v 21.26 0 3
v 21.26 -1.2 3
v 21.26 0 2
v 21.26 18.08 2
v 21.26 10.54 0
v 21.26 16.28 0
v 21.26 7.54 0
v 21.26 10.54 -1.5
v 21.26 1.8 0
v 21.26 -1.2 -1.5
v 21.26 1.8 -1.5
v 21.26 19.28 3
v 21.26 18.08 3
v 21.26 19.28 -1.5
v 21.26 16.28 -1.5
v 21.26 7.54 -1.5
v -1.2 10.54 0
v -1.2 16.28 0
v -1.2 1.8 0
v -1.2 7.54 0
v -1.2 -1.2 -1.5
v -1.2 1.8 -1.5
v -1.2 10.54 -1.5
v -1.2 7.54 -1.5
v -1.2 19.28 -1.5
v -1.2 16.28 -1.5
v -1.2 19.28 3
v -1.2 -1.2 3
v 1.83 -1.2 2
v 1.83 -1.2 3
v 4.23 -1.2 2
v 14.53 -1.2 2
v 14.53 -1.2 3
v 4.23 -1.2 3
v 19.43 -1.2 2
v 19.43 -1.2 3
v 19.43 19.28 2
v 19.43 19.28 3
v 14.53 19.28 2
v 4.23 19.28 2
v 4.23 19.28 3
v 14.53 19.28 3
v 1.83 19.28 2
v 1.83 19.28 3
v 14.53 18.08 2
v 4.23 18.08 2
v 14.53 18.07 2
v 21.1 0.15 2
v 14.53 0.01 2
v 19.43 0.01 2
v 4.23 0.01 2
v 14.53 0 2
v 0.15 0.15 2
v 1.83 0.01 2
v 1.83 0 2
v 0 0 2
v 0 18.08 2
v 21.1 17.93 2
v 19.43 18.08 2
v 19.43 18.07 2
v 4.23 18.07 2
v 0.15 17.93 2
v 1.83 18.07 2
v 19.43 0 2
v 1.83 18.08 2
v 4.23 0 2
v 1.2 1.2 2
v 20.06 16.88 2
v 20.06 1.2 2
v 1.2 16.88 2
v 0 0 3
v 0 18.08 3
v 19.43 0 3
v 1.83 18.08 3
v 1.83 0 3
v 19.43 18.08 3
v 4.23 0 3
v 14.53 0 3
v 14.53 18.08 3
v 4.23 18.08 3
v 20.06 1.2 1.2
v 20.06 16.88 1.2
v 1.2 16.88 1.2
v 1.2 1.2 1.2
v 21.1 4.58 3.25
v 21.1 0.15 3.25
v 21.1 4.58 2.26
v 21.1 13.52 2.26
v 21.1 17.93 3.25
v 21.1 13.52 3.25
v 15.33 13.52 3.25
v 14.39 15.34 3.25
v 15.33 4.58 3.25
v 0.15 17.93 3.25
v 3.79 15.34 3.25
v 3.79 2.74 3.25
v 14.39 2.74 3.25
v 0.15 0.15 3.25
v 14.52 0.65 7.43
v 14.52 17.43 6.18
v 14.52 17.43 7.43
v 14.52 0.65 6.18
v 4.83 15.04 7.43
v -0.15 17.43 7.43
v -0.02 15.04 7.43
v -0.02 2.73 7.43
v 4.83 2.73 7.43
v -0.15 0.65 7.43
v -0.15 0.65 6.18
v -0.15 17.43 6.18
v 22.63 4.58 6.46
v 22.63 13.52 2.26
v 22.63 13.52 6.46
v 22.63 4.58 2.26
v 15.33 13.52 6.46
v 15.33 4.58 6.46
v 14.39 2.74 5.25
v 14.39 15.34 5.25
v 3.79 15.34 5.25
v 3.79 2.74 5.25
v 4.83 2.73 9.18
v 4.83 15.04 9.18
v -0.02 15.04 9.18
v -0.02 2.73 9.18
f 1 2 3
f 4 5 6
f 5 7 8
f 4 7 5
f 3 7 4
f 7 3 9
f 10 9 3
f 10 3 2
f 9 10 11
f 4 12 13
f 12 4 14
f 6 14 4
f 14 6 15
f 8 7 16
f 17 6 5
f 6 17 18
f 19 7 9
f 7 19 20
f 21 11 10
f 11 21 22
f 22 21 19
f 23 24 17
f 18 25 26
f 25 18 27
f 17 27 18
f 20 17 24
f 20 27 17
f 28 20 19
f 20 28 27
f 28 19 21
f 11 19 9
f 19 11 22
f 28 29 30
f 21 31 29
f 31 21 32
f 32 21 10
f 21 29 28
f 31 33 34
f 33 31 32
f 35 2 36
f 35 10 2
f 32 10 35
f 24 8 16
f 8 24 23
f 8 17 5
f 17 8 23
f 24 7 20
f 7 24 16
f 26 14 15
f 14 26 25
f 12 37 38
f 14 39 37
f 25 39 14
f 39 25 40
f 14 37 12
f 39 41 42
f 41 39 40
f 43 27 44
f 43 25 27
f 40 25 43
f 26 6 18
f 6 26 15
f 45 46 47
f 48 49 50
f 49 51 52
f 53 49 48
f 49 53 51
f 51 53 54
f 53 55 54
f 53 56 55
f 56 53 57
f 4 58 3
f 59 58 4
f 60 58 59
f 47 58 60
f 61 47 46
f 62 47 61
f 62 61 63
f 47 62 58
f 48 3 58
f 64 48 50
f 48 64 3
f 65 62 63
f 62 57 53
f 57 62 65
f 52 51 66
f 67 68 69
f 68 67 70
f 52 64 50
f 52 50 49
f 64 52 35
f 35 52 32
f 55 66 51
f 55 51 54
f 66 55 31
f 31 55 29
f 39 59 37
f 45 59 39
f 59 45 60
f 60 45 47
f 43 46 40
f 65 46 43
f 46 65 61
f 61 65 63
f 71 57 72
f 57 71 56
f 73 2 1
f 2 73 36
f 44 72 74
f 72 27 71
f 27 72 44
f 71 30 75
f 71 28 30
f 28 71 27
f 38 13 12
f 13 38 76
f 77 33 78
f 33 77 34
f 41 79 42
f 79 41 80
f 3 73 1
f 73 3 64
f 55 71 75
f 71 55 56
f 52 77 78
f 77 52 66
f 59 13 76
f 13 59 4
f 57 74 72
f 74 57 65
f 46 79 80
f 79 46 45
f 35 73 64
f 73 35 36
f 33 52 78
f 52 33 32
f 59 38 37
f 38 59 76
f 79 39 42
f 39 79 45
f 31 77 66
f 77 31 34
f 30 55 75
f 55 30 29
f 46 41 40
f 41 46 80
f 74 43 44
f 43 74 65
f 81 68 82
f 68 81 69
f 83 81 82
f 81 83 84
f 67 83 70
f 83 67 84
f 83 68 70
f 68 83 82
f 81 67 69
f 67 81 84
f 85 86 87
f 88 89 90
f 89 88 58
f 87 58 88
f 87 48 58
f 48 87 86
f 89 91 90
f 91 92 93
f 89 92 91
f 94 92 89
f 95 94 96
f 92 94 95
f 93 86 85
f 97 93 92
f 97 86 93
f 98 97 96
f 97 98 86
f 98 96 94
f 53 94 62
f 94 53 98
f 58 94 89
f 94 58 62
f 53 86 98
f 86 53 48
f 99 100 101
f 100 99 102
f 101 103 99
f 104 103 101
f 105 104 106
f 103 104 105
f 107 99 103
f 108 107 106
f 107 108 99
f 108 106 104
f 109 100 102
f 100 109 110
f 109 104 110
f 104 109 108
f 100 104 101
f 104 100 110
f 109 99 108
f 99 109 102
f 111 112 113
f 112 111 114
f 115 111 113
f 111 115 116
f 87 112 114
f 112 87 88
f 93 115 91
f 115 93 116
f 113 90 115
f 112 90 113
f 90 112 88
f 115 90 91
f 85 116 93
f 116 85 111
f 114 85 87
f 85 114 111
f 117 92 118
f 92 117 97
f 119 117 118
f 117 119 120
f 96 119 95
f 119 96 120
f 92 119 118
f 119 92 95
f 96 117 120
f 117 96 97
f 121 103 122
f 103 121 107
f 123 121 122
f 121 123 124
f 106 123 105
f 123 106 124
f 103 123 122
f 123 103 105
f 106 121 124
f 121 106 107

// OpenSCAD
// FPV audio recorder holder, v2 (2026-10-10). Not yet printed or test-fitted.
// Holds the bottom board of a Seeed XIAO ESP32S3 Sense stack (camera removed) by its edges.
// Dimensions come from Seeed's official 3D model (seeed-studio-xiao-esp32s3-sense-3d_model.zip):
//   main board 20.96 x 17.78 mm, 1.25 mm thick, flat underside;
//   Sense board sits 2.9 mm above it and does not cover the USB-C end;
//   USB-C overhangs the board end by 1.5 mm.
// The walls stop below the main board's top surface, so they never touch the harness
// wires, which leave from the gap between the two boards. The top stays fully open.
// Orientation: length along X with the USB-C end at +X; width along Y; up is +Z.
// Units: mm.

/* [Board, from Seeed's model] */
board_len = 20.96;
board_wid = 17.78;
board_t   = 1.25;

/* [Fit] */
clearance  = 0.15;  // per side; raise to 0.25 if the board will not drop in
wall_below_top = 0.25; // wall top sits this far below the board's top surface

/* [Holder] */
ledge_t   = 2.0;    // base thickness under the board's edges
ledge_w   = 1.2;    // width of the ledge the board edges rest on
tape_recess = 0.8;  // pocket under the board for a VHB square (1.0-1.1 mm VHB compresses into it)
wall_t    = 1.2;
rail_h    = 1.5;    // underside rails = air gap above the O4's metal top
rail_w    = 3.0;
rail_count = 3;
// Wall notches at the solder pads used by the harness, as [start, end] along X measured
// from the board's centre. Pins are on a 2.54 mm pitch, 7.62 mm either side of centre:
// 5V and GND are the two pins nearest the USB end; D6 and D7 are the last pins at the
// far end. Both sides are notched so either solder position clears.
notch_ranges = [[3.9, 8.8], [-8.8, -6.4]];

$fn = 48;
pl = board_len + 2*clearance;
pw = board_wid + 2*clearance;
wall_h = board_t - wall_below_top;   // wall height above the ledge

module holder() {
  difference() {
    union() {
      // base
      translate([-wall_t, -wall_t, 0]) cube([pl + wall_t, pw + 2*wall_t, ledge_t]);
      // walls on three sides; the USB-C end (+X) stays open
      translate([-wall_t, -wall_t, ledge_t]) cube([wall_t, pw + 2*wall_t, wall_h]);
      translate([-wall_t, -wall_t, ledge_t]) cube([pl + wall_t, wall_t, wall_h]);
      translate([-wall_t, pw, ledge_t]) cube([pl + wall_t, wall_t, wall_h]);
      // underside rails, lengthwise so air passes under
      for (i = [0 : rail_count - 1])
        translate([-wall_t, -wall_t + (pw + 2*wall_t - rail_w) * i / (rail_count - 1), -rail_h])
          cube([pl + wall_t, rail_w, rail_h]);
    }
    // VHB recess inside the ledge
    translate([ledge_w, ledge_w, ledge_t - tape_recess])
      cube([pl - 2*ledge_w, pw - 2*ledge_w, tape_recess + 0.01]);
    // notches at the harness pads
    for (r = notch_ranges, side = [0, 1])
      translate([pl/2 + r[0], side ? pw - 0.01 : -wall_t - 0.01, ledge_t])
        cube([r[1] - r[0], wall_t + 0.02, wall_h + 0.01]);
  }
}

holder();

// Preview only: simplified board, using measurements from Seeed's 3D model
// (camera removed). It is never part of the exported part.
show_board = true;
// STEP (x, y, z) box -> holder coordinates: x + 8.67, 2.78 - z, y + 0.25, plus clearance.
module step_box(x0, x1, y0, y1, z0, z1)
  translate([clearance + x0 + 8.67, clearance + 2.78 - z1, ledge_t + y0 + 0.25])
    cube([x1 - x0, z1 - z0, y1 - y0]);
module board() {
  color([0.12, 0.40, 0.22]) step_box(-8.67, 12.28, -0.25, 1.00, -15.00, 2.78);  // XIAO main board
  color([0.12, 0.40, 0.22]) step_box(-8.97, 5.70, 3.93, 5.18, -14.50, 2.28);    // Sense board
  color([0.75, 0.75, 0.78]) step_box(6.51, 13.81, 0.01, 4.21, -10.59, -1.65);   // USB-C
  color([0.75, 0.75, 0.78]) step_box(-5.03, 5.57, 1.00, 3.00, -12.41, 0.19);    // RF shield
  color([0.92, 0.92, 0.88]) step_box(-8.84, -3.99, 5.17, 6.93, -12.11, 0.20);   // camera FPC connector
}
if (show_board) board();
